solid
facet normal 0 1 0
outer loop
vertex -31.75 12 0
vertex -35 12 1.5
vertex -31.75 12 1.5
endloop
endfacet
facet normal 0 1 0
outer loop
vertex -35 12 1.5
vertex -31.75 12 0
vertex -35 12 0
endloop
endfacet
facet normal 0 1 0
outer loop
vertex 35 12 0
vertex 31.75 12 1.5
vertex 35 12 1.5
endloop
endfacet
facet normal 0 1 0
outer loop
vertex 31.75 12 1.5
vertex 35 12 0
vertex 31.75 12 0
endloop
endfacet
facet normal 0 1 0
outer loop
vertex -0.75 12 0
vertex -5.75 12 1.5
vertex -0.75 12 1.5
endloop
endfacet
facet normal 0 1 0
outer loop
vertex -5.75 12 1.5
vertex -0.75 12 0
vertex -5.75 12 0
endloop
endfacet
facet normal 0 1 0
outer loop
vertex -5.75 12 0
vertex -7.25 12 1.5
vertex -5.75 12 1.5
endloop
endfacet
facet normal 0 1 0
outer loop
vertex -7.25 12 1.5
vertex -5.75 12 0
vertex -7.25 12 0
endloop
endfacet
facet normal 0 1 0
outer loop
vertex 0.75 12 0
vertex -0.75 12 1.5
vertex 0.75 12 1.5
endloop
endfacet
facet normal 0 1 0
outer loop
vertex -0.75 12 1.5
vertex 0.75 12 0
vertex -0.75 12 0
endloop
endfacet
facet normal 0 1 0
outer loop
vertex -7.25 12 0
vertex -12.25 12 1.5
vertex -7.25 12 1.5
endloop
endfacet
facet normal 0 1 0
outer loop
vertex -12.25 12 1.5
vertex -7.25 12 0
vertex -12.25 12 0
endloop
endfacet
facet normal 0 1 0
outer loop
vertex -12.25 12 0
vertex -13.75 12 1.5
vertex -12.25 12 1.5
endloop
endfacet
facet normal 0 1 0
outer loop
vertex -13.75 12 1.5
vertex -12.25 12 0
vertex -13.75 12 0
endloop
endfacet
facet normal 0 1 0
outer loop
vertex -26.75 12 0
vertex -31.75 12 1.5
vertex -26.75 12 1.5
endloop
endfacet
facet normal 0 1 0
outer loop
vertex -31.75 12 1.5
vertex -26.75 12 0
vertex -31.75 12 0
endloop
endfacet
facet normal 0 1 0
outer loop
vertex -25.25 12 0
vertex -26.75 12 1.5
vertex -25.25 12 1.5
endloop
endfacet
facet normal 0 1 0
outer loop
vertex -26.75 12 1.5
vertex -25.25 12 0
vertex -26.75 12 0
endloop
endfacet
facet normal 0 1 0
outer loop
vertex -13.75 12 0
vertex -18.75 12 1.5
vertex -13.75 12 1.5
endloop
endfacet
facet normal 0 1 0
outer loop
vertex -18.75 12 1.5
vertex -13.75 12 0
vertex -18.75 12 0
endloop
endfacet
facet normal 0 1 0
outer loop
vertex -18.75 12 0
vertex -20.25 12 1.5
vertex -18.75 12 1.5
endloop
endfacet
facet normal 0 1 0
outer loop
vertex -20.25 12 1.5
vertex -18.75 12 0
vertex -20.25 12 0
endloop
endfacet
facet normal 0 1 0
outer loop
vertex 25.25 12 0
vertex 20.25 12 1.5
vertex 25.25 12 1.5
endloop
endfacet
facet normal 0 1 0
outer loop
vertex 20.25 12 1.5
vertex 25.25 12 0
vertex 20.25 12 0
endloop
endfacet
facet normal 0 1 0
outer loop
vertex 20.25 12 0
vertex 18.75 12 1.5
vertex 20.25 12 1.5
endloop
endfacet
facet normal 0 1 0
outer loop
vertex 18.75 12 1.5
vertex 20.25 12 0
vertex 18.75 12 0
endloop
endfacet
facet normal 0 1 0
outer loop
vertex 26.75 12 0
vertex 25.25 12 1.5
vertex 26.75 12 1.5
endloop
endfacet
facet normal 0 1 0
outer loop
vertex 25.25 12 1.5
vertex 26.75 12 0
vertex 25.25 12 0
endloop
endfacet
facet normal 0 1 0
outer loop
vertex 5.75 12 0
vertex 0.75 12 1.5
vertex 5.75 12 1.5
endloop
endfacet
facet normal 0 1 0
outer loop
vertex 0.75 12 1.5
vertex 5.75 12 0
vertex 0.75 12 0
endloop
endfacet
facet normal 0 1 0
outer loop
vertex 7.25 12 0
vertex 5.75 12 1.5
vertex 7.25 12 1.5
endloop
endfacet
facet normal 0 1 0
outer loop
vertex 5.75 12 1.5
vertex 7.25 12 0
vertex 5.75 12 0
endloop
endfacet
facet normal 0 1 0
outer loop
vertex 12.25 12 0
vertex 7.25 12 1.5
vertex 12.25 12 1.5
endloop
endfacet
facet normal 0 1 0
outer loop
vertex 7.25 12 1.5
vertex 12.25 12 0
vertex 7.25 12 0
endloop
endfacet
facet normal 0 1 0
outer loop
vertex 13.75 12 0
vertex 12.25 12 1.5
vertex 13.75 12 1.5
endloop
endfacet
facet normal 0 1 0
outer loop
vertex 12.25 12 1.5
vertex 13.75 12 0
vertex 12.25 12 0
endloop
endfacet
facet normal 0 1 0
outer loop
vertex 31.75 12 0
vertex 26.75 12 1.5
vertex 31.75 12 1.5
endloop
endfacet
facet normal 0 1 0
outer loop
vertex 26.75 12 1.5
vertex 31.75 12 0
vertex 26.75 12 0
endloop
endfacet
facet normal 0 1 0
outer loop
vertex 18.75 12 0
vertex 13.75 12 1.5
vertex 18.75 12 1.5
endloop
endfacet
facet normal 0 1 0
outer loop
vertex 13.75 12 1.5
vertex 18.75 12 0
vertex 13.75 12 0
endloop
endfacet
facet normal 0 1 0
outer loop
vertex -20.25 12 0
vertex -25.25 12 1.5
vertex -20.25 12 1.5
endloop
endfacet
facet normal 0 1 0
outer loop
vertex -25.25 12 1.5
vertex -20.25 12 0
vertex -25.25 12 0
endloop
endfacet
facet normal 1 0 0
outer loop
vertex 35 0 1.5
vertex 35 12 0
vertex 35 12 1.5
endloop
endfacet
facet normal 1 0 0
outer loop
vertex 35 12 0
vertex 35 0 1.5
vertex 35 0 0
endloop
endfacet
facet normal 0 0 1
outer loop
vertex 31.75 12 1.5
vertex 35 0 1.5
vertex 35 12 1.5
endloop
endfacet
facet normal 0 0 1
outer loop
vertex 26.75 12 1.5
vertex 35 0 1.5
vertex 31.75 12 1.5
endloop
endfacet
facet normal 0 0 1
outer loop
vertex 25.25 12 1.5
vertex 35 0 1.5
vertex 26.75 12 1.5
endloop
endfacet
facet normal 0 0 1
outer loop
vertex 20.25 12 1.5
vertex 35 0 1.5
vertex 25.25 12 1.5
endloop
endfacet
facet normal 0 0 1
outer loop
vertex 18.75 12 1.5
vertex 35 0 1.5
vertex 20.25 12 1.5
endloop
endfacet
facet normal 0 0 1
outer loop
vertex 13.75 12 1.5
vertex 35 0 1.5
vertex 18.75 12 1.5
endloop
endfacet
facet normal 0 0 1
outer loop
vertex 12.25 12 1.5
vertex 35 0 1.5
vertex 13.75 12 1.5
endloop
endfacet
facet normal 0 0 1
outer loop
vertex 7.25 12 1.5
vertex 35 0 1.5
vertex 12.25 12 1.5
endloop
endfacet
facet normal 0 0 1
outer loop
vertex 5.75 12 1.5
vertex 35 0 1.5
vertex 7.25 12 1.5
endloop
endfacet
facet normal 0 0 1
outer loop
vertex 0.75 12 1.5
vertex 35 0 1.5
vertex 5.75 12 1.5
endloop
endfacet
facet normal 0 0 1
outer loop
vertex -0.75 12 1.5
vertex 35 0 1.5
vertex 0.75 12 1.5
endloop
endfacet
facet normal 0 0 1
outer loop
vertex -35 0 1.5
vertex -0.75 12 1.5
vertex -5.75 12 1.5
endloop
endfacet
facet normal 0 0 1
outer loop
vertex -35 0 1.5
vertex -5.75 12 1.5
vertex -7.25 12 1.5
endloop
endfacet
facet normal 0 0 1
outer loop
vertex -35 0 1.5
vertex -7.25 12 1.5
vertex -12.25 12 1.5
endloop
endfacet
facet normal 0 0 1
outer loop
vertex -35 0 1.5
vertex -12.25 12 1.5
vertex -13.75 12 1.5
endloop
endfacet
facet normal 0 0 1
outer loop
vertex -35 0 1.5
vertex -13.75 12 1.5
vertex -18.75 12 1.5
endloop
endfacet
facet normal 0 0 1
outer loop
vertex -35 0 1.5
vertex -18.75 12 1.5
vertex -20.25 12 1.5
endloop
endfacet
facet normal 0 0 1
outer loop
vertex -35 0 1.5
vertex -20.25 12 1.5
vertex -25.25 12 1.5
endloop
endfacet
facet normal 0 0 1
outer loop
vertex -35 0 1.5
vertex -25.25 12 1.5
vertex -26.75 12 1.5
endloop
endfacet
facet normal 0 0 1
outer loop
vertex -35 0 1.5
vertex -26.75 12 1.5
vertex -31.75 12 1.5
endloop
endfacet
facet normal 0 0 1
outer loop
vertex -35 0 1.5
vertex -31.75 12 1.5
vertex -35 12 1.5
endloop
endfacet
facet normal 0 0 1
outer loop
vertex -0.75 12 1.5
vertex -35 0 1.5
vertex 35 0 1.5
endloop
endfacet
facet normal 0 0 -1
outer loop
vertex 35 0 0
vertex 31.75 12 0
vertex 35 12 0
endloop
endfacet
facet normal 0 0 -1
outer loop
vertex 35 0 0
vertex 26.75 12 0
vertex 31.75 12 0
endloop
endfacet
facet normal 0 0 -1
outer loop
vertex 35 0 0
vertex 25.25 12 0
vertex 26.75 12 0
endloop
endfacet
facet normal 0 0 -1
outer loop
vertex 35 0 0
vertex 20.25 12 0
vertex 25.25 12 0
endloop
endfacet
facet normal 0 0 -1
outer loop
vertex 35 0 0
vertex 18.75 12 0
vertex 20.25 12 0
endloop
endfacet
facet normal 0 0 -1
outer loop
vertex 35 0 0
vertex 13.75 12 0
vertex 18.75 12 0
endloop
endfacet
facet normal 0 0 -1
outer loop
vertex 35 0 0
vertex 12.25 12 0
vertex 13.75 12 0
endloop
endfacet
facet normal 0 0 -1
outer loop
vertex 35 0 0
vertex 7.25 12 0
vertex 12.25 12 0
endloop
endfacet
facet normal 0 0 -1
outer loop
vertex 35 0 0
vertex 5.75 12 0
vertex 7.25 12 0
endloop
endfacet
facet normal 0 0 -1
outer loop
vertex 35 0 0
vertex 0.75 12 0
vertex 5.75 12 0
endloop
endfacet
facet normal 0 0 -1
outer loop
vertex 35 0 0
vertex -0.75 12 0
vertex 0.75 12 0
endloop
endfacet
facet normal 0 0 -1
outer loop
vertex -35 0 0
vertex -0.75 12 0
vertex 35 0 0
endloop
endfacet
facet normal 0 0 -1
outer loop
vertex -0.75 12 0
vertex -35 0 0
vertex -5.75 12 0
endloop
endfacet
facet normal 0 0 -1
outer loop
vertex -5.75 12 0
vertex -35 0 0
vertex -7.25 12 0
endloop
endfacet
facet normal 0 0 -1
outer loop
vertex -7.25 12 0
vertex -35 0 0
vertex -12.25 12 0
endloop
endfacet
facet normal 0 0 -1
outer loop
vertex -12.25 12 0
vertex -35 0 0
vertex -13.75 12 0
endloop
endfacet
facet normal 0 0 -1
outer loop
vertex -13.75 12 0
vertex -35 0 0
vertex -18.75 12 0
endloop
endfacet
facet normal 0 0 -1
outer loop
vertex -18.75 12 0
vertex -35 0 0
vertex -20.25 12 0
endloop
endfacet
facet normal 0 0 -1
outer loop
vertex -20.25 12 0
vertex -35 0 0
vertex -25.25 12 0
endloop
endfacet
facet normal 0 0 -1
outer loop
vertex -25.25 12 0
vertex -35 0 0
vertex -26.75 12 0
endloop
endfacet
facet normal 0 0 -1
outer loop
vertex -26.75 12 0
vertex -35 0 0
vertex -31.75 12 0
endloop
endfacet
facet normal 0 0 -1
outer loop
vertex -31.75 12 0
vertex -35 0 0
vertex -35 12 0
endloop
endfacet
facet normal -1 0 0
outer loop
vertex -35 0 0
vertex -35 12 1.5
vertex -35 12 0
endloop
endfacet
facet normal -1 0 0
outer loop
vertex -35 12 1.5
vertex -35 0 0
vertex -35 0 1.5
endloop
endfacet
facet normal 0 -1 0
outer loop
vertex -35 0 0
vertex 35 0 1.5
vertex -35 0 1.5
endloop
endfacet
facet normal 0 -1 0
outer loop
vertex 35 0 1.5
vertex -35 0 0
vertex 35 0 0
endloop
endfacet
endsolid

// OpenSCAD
// 10-well comb for agarose gel casting, printed lying flat
// Units: mm

// ---- Spine ----
spine_len   = 70;    // spine length along X
spine_wid   = 12;    // spine width along Y

// ---- Teeth ----
n_teeth     = 10;    // number of teeth
tooth_w     = 5.0;   // tooth width along X
tooth_len   = 12;    // tooth length along Y (into -Y)
gap         = 1.5;   // gap between neighbouring teeth along X

// ---- Plate ----
plate_t     = 1.5;   // plate thickness along Z

// ---- Misc ----
eps         = 0.5;   // cutter overshoot past faces
$fn         = 64;

// Derived
pitch       = tooth_w + gap;              // centre-to-centre tooth spacing
row_span    = (n_teeth - 1) * gap;        // total gap width
x_start     = -(n_teeth * tooth_w + row_span) / 2; // first tooth left edge

difference() {
    // Spine (back bar)
    translate([-spine_len / 2, 0, 0])
        cube([spine_len, spine_wid, plate_t]);

    // Teeth hanging from the -Y edge of the spine
    for (i = [0 : n_teeth - 1])
        translate([x_start + i * pitch, tooth_len, 0])
            cube([tooth_w, tooth_len, plate_t]);
}
